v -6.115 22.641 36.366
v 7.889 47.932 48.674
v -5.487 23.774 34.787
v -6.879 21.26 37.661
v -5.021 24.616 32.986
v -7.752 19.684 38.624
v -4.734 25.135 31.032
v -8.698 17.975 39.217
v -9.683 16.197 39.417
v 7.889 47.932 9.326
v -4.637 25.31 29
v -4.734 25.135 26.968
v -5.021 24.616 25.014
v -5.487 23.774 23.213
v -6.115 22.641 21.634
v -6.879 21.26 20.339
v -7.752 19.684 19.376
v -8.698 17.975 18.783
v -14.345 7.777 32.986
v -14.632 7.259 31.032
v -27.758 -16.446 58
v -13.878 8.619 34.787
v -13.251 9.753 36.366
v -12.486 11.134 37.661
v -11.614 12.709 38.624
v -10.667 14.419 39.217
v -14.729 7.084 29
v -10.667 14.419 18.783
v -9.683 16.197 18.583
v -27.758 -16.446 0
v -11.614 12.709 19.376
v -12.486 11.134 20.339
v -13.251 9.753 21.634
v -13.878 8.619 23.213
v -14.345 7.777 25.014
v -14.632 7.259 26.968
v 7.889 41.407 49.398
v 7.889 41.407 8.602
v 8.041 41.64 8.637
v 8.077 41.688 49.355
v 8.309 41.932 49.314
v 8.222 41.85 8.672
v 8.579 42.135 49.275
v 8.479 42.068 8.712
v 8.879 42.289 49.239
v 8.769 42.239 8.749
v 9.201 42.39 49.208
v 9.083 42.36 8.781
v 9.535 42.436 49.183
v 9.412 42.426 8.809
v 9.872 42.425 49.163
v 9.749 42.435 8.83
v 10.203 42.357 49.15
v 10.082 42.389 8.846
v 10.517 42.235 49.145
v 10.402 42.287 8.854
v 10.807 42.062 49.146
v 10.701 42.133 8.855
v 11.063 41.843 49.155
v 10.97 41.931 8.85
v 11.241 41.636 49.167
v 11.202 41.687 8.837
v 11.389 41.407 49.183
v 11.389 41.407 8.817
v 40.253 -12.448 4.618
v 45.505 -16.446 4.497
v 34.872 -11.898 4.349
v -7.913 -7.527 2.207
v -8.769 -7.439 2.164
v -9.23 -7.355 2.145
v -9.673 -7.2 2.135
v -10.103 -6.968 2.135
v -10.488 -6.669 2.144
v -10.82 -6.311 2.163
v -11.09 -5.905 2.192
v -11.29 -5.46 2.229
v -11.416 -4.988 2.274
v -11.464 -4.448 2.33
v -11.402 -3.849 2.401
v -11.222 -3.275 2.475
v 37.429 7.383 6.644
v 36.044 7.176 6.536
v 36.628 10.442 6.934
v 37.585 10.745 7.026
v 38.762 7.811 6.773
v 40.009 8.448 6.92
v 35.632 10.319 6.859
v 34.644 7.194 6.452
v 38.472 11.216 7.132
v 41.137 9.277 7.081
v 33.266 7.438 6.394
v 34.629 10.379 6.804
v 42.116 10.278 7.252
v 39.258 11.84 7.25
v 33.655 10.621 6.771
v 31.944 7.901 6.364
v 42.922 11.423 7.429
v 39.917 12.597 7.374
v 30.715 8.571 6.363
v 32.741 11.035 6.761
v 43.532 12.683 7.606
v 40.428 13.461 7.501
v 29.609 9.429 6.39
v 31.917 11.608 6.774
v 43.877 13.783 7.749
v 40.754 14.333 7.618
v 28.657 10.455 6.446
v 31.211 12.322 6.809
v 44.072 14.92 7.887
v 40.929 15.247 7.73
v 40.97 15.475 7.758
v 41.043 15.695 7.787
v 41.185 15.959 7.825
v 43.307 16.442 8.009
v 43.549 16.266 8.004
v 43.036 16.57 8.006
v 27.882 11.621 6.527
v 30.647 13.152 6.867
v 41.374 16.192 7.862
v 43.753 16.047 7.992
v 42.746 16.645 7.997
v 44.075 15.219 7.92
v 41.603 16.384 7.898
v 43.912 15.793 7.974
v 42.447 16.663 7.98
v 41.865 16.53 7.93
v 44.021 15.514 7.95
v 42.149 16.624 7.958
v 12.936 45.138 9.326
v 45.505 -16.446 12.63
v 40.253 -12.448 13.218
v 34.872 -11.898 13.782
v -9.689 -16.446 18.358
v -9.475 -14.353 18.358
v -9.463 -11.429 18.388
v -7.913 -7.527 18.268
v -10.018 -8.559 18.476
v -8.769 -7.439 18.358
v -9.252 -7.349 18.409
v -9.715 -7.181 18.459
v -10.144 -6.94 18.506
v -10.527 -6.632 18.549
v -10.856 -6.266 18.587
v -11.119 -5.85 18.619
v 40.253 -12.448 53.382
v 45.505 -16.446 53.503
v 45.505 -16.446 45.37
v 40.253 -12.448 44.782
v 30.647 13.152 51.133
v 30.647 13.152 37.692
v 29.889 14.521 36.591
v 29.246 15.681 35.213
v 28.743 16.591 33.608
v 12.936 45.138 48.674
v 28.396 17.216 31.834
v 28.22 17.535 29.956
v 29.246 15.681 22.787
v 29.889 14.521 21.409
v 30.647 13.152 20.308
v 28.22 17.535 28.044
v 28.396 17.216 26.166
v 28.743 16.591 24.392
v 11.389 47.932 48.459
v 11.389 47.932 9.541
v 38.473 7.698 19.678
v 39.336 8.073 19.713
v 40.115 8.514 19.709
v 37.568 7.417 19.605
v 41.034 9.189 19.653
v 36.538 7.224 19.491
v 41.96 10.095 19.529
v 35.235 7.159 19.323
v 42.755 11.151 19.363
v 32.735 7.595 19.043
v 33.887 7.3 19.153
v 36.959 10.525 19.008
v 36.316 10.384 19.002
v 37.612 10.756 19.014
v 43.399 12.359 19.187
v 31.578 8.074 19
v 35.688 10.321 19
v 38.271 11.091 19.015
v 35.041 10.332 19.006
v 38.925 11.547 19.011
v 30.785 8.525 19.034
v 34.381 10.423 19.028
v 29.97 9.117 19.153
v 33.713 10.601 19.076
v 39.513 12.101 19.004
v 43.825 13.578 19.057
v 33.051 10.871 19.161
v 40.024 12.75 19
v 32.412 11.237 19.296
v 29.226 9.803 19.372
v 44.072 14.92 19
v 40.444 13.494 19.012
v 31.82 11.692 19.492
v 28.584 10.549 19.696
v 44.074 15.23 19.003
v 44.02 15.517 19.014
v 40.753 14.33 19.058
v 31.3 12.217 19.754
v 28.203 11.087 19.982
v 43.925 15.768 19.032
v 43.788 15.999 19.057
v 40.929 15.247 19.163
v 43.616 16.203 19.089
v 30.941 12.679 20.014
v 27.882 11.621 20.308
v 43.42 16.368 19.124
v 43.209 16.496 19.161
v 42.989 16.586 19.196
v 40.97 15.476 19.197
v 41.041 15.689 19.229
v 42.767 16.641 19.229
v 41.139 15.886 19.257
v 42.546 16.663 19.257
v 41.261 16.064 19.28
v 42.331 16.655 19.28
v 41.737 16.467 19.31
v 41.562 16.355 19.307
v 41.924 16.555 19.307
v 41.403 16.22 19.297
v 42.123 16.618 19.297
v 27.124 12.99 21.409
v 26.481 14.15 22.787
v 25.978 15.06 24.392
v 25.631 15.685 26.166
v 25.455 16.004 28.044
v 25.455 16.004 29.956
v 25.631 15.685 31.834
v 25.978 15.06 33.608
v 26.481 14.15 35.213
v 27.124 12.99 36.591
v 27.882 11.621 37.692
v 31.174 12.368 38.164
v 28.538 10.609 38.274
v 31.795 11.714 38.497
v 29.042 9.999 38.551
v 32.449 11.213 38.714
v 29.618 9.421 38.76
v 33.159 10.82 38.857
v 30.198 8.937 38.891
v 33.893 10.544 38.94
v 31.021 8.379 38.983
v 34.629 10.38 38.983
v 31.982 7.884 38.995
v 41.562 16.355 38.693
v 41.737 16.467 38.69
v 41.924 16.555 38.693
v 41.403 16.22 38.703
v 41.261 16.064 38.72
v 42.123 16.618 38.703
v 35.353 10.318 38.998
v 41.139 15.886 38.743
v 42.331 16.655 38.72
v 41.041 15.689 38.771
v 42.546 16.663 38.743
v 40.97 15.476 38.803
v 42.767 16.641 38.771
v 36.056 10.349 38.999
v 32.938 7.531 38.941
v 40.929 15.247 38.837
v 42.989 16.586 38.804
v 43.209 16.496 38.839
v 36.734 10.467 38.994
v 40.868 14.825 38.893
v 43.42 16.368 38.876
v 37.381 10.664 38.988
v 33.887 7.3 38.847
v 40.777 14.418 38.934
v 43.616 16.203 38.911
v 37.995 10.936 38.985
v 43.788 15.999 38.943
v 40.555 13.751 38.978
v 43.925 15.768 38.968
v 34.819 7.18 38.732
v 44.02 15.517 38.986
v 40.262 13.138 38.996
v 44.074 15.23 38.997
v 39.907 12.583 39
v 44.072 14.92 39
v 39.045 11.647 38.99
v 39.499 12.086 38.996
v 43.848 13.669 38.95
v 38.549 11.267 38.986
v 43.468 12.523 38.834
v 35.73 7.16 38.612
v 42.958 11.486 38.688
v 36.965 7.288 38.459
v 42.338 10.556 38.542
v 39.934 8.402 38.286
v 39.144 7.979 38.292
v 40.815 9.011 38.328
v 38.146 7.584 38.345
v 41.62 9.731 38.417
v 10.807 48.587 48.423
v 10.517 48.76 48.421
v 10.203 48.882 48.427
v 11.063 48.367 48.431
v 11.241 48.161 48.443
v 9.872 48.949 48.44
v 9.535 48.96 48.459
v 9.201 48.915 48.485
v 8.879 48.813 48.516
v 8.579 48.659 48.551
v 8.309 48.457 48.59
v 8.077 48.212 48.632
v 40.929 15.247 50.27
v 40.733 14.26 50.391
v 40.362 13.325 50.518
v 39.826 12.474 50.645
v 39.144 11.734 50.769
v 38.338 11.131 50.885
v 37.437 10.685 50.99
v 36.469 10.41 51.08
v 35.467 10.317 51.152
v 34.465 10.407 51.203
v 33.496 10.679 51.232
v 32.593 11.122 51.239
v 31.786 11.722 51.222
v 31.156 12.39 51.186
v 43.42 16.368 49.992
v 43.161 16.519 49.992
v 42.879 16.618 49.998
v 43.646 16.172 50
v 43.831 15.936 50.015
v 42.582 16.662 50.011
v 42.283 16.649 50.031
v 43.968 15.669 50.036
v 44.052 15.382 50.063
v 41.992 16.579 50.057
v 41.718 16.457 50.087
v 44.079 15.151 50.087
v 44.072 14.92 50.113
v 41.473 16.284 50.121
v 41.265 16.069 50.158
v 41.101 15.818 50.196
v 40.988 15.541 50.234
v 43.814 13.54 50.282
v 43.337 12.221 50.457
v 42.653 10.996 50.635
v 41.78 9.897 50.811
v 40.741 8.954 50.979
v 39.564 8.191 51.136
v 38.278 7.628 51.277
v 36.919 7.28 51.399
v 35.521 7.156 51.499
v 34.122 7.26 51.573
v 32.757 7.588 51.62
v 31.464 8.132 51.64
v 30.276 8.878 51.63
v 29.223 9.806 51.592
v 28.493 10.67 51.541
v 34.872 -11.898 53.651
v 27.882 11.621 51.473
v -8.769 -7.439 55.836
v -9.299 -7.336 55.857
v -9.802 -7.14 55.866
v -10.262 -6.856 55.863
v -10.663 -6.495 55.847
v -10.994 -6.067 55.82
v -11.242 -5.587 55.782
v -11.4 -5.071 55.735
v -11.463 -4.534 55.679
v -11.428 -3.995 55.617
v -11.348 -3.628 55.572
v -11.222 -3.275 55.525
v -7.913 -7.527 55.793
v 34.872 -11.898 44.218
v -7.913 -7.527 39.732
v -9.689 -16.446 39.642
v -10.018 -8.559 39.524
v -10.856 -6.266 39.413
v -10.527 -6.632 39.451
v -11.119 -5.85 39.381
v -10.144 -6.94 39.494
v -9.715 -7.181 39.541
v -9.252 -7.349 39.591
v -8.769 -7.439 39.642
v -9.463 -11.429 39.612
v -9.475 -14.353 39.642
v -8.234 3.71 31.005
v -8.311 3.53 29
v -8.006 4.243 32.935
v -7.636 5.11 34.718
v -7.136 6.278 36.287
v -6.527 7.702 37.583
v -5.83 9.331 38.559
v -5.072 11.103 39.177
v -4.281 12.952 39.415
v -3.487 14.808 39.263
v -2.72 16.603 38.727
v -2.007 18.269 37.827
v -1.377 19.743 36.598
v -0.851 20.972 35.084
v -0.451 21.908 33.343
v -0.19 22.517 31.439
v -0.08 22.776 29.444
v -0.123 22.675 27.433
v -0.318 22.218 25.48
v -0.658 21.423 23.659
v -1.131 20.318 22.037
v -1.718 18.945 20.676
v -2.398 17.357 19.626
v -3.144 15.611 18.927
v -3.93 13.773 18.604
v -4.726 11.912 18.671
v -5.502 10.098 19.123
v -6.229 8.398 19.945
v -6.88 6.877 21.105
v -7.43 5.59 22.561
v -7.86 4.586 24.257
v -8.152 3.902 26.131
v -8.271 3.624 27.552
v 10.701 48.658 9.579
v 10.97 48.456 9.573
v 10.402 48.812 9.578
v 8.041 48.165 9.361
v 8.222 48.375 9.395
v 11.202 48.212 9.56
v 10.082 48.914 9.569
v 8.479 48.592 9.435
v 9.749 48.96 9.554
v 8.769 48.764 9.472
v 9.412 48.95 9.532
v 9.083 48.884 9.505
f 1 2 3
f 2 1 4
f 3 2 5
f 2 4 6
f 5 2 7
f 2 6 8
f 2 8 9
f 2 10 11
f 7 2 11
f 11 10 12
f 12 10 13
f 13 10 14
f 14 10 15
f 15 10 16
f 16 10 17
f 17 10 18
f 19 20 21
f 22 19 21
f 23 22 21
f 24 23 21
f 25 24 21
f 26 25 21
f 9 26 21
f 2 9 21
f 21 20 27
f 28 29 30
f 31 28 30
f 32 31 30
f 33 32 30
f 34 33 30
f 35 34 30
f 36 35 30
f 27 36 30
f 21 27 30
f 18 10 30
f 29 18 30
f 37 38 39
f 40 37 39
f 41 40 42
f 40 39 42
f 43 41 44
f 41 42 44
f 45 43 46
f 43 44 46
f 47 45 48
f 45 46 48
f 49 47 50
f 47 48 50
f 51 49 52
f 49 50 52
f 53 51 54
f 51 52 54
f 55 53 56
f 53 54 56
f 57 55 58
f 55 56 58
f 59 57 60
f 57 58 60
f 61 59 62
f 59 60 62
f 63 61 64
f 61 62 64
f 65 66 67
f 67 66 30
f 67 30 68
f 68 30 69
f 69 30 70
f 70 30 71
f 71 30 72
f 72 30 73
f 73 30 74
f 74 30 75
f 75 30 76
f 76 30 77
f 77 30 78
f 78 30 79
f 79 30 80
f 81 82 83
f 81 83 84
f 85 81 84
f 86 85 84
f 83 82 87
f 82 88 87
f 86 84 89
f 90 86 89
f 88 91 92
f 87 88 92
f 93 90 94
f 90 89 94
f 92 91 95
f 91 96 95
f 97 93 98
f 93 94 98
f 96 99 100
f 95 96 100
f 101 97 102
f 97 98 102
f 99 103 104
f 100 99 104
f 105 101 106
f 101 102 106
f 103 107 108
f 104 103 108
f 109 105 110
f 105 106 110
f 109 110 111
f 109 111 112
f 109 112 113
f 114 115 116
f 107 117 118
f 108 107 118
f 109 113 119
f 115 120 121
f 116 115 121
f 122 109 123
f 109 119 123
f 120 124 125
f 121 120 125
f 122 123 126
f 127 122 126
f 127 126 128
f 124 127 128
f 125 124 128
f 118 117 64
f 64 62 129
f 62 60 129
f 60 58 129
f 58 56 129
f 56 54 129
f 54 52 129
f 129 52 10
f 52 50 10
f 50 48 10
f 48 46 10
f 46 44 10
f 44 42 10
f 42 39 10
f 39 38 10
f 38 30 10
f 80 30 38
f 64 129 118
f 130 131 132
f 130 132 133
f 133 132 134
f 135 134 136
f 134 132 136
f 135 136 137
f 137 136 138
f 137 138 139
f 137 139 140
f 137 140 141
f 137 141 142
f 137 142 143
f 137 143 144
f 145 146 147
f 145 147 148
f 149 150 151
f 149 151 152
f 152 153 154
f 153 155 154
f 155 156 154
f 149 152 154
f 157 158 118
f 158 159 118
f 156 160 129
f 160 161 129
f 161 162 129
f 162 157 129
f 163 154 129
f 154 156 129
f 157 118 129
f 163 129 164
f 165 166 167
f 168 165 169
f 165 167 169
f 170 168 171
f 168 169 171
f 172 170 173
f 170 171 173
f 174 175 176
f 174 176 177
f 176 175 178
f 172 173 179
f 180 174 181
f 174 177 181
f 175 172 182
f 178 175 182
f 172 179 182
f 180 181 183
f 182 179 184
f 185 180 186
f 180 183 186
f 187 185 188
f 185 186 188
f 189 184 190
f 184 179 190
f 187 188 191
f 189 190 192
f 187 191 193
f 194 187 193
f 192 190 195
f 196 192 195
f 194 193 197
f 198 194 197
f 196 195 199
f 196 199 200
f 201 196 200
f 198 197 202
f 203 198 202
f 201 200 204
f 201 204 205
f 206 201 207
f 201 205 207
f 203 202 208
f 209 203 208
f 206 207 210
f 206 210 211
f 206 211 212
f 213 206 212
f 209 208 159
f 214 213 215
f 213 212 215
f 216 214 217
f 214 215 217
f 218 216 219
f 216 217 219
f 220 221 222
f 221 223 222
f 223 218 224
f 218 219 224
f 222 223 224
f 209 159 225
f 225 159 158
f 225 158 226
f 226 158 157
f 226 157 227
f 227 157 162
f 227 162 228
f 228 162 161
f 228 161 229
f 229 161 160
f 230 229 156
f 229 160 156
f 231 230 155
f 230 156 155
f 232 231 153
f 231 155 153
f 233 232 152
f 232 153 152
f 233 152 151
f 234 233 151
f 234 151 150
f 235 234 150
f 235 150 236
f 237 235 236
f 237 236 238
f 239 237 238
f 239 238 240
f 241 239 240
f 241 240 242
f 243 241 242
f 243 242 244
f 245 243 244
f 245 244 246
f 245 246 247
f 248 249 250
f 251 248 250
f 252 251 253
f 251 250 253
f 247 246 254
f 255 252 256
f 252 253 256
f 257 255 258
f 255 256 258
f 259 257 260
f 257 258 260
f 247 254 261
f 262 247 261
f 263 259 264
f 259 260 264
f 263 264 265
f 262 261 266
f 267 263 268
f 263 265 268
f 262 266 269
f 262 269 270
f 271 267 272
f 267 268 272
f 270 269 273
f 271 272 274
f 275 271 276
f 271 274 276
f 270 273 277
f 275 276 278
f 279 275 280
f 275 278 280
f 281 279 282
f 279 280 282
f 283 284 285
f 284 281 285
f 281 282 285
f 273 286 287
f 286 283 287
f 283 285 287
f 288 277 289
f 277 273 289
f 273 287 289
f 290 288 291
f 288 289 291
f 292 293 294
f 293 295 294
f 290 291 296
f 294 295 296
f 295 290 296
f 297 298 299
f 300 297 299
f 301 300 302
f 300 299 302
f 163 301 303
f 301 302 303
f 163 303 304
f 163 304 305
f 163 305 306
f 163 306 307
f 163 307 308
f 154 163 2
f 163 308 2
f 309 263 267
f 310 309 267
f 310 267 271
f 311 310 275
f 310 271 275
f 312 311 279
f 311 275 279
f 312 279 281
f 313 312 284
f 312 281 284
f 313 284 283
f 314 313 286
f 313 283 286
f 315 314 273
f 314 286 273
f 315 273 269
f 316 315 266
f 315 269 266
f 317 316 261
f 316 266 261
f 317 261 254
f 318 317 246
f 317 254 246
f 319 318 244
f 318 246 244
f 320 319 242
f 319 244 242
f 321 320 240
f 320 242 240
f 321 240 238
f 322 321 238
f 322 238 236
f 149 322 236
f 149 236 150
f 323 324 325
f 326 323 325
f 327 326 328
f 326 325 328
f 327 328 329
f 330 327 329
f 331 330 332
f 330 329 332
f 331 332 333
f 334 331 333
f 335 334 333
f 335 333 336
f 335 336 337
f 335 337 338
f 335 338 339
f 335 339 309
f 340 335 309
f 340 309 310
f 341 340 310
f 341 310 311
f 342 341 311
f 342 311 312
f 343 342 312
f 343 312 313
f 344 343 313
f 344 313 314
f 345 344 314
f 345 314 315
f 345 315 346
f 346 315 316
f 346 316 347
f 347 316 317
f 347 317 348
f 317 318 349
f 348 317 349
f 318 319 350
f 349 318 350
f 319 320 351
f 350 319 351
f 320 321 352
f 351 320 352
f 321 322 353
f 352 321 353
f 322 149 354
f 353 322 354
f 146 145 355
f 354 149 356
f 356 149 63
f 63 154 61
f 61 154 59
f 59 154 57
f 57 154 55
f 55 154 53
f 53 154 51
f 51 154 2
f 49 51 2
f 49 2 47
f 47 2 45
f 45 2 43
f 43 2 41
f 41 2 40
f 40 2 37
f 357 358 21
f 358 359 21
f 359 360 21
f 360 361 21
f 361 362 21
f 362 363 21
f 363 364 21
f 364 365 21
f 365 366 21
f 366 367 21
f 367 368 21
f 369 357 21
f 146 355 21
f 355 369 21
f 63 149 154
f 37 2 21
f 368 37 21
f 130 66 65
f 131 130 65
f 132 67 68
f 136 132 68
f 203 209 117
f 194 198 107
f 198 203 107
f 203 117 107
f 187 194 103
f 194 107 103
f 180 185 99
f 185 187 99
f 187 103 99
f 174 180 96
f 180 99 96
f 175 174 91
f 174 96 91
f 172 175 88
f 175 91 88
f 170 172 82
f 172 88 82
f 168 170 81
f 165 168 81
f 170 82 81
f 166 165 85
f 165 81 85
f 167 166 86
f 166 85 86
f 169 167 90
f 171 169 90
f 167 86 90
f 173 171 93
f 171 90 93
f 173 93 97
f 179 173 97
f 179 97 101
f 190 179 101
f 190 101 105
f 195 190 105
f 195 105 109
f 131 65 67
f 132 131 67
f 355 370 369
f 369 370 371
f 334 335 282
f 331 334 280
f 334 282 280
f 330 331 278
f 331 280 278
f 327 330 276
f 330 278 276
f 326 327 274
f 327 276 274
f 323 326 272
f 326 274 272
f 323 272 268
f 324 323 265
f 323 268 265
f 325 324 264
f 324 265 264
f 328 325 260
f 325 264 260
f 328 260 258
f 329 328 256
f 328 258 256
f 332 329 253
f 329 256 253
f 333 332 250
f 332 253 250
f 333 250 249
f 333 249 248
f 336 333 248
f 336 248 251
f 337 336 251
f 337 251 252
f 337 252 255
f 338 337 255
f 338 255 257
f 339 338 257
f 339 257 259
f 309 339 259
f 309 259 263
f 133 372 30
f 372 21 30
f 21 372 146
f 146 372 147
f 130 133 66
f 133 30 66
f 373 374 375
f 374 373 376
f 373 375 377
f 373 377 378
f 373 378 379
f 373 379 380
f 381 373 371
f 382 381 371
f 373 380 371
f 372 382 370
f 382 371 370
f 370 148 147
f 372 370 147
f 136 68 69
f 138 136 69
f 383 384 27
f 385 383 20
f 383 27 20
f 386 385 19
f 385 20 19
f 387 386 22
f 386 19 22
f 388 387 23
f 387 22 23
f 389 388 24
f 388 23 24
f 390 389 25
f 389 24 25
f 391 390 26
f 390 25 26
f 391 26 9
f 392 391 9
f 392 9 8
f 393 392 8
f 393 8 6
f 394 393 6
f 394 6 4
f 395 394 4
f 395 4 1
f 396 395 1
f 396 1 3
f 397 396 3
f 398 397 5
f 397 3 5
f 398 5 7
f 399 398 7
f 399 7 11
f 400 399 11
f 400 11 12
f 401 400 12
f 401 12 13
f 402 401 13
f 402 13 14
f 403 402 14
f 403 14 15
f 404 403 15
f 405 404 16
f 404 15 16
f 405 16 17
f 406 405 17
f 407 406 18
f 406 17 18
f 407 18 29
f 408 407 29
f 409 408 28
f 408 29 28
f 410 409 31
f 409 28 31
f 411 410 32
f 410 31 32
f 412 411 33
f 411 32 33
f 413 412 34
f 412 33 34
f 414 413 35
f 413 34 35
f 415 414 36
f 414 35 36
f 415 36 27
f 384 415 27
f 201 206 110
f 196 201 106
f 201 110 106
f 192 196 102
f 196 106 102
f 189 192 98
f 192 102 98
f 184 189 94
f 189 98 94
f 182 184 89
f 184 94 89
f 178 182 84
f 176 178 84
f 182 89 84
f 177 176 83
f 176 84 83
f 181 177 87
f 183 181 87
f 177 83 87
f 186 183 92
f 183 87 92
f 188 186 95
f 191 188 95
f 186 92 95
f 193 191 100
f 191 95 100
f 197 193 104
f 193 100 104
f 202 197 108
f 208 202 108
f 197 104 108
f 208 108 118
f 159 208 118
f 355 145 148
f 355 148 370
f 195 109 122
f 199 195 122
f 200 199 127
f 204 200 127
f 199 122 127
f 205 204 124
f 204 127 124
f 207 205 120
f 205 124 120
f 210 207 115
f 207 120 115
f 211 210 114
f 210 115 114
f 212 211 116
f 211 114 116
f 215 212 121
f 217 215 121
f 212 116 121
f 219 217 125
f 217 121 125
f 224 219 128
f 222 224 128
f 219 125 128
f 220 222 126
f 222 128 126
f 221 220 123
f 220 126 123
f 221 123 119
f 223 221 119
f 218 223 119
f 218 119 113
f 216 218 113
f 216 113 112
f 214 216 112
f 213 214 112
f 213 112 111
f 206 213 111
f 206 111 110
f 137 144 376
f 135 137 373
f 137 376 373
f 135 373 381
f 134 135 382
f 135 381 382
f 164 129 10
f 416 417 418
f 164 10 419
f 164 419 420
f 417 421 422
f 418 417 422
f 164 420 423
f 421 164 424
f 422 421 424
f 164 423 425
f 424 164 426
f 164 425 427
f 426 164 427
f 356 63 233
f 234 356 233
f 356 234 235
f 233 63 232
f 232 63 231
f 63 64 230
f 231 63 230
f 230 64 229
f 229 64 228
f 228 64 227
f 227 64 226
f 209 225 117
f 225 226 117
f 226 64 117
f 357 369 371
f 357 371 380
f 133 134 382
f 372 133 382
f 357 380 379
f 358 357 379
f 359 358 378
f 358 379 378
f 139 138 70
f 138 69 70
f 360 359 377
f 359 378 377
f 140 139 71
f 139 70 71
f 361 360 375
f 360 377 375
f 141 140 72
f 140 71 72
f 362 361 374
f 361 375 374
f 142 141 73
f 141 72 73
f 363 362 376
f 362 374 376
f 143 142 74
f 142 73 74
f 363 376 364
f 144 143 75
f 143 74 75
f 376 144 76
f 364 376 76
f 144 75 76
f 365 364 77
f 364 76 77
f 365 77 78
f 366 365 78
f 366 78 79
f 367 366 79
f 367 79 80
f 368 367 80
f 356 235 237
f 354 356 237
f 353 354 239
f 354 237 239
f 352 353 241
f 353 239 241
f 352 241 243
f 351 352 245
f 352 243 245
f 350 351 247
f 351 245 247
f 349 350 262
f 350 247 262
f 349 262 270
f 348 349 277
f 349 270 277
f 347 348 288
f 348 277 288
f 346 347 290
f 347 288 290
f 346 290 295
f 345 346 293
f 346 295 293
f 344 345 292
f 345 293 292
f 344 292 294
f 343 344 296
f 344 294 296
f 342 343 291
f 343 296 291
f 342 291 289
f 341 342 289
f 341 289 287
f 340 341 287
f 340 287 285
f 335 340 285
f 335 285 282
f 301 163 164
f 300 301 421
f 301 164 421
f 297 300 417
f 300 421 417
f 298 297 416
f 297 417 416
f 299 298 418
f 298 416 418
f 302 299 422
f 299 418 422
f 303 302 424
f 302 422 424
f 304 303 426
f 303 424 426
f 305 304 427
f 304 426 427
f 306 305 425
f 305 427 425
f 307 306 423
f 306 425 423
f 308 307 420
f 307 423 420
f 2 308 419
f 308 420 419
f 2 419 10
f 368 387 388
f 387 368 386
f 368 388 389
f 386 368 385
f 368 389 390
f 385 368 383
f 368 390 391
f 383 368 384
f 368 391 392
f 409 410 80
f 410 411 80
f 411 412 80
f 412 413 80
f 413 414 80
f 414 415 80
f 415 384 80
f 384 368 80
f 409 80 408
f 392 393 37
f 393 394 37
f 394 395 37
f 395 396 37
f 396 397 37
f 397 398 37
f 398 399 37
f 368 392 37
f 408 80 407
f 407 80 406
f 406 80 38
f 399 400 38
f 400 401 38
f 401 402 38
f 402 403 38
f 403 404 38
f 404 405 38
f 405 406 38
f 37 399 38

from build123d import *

# Parameters (mm, degrees)
F1_DEPTH      = 58
F3_DEPTH      = 25
F5_DEPTH      = 95.4
F6_R          = 15
F7_R          = 10
F8_DEPTH      = 10
F8_DEPTH_BACK = 20
F9_R          = 10.4169044955
F10_DEPTH     = 25


with BuildPart() as f1:
    # F0 (on Top) → F1 (new body)
    with BuildSketch(Plane.XY):
        with BuildLine():
            ThreePointArc((11.3887710857, 47.9319766204), (9.6390886527, 48.9631570378), (7.8894062197, 47.9319766204))
            Line((7.8894062197, 47.9319766204), (-27.7575390254, -16.4461955428))
            Line((-27.7575390254, -16.4461955428), (45.5045364797, -16.4461955428))
            Line((45.5045364797, -16.4461955428), (40.2530199854, -12.4482339651))
            Line((40.2530199854, -12.4482339651), (34.8717773227, -11.8983741444))
            Line((34.8717773227, -11.8983741444), (-7.9129768242, -7.5265926221))
            Line((-7.9129768242, -7.5265926221), (-8.7686574365, -7.4391584702))
            ThreePointArc((-8.7686574365, -7.4391584702), (-11.0484779416, -5.9775041051), (-11.2219896129, -3.2749296438))
            Line((-11.2219896129, -3.2749296438), (7.8894062197, 41.407315159))
            ThreePointArc((7.8894062197, 41.407315159), (9.6390886527, 42.4384955764), (11.3887710857, 41.407315159))
            Line((11.3887710857, 41.407315159), (27.8816032063, 11.6213579495))
            ThreePointArc((27.8816032063, 11.6213579495), (37.1870634085, 7.3303350671), (44.0722971617, 14.9196712118))
            ThreePointArc((44.0722971617, 14.9196712118), (42.6641613212, 16.6551483551), (40.9286841779, 15.2470125146))
            ThreePointArc((40.9286841779, 15.2470125146), (36.556153133, 10.4273347675), (30.6466350134, 13.1523883301))
            Line((30.6466350134, 13.1523883301), (11.3887710857, 47.9319766204))
        make_face()
    extrude(amount=F1_DEPTH)

    # F2 (on face) → F3 (cut)
    with BuildSketch(Plane(origin=(-0.842891654, -8.2490197652, 0), x_dir=(-0.9948200667, 0.1016515362, 0), z_dir=(0.1016515362, 0.9948200667, 0))):
        Polygon((-41.3098941341, 13.2178132166), (-41.3098941341, 29), (-83.8253051043, 29), (-83.8253051043, 8.7828920186), align=None)
        Polygon((-41.3098941341, 29), (-41.3098941341, 44.7821867834), (-83.8253051043, 49.2171079814), (-83.8253051043, 29), align=None)
        Polygon((7.9670344895, 29), (7.9670344895, 39.6419496238), (-41.3098941341, 44.7821867834), (-41.3098941341, 29), align=None)
        Polygon((7.9670344895, 18.3580503762), (7.9670344895, 29), (-41.3098941341, 29), (-41.3098941341, 13.2178132166), align=None)
    extrude(amount=-F3_DEPTH, mode=Mode.SUBTRACT)

    # F4 (on face) → F5 (cut)
    with BuildSketch(Plane(origin=(-14.2745575957, 7.9039891304, 0), x_dir=(-0.4844097913, -0.8748412165, 0), z_dir=(-0.8748412165, 0.4844097913, 0))):
        Polygon((-45.7545743561, 0), (27.833833402, 0), (-45.7545743561, 9.3257259006), align=None)
        Polygon((-45.7545743561, 58), (-45.7545743561, 48.6742740994), (27.833833402, 58), align=None)
        Polygon((27.833833402, -12.4238803983), (27.833833402, 0), (-45.7545743561, 0), (-45.7545743561, 9.3257259006), (-52.6641197503, 10.201360099), (-53.7899360061, -12.4238803983), align=None)
        Polygon((-52.6641197503, 47.798639901), (-45.7545743561, 48.6742740994), (-45.7545743561, 58), (27.833833402, 58), (27.833833402, 63.3924901485), (-55.1632341309, 67.5189115496), align=None)
    extrude(amount=-F5_DEPTH, mode=Mode.SUBTRACT)

    # F6
    f6_edges = [f1.edges().sort_by_distance(p)[0] for p in [
        (-8.768657, -7.439158, 10.261165),
        (-8.768657, -7.439158, 29),
        (-8.768657, -7.439158, 47.738835),
    ]]
    fillet(f6_edges, radius=F6_R)

    # F7 (on face) → F8 (cut, two sides)
    with BuildSketch(Plane(origin=(29.0290557323, 16.0737269393, 0), x_dir=(-0.4844097913, 0.8748412165, 0), z_dir=(0.8748412165, 0.4844097913, 0))) as f8_sk:
        with Locations((-8.284128271, 29)):
            Circle(F7_R)
    extrude(amount=-F8_DEPTH, mode=Mode.SUBTRACT)
    extrude(f8_sk.sketch, amount=F8_DEPTH_BACK, mode=Mode.SUBTRACT)

    # F9 (on face) → F10 (cut)
    with BuildSketch(Plane(origin=(-14.2745575957, 7.9039891304, 0), x_dir=(-0.4844097913, -0.8748412165, 0), z_dir=(-0.8748412165, 0.4844097913, 0))):
        with Locations((-9.4790859148, 29)):
            Circle(F9_R)
    extrude(amount=-F10_DEPTH, mode=Mode.SUBTRACT)


solid = f1.part
